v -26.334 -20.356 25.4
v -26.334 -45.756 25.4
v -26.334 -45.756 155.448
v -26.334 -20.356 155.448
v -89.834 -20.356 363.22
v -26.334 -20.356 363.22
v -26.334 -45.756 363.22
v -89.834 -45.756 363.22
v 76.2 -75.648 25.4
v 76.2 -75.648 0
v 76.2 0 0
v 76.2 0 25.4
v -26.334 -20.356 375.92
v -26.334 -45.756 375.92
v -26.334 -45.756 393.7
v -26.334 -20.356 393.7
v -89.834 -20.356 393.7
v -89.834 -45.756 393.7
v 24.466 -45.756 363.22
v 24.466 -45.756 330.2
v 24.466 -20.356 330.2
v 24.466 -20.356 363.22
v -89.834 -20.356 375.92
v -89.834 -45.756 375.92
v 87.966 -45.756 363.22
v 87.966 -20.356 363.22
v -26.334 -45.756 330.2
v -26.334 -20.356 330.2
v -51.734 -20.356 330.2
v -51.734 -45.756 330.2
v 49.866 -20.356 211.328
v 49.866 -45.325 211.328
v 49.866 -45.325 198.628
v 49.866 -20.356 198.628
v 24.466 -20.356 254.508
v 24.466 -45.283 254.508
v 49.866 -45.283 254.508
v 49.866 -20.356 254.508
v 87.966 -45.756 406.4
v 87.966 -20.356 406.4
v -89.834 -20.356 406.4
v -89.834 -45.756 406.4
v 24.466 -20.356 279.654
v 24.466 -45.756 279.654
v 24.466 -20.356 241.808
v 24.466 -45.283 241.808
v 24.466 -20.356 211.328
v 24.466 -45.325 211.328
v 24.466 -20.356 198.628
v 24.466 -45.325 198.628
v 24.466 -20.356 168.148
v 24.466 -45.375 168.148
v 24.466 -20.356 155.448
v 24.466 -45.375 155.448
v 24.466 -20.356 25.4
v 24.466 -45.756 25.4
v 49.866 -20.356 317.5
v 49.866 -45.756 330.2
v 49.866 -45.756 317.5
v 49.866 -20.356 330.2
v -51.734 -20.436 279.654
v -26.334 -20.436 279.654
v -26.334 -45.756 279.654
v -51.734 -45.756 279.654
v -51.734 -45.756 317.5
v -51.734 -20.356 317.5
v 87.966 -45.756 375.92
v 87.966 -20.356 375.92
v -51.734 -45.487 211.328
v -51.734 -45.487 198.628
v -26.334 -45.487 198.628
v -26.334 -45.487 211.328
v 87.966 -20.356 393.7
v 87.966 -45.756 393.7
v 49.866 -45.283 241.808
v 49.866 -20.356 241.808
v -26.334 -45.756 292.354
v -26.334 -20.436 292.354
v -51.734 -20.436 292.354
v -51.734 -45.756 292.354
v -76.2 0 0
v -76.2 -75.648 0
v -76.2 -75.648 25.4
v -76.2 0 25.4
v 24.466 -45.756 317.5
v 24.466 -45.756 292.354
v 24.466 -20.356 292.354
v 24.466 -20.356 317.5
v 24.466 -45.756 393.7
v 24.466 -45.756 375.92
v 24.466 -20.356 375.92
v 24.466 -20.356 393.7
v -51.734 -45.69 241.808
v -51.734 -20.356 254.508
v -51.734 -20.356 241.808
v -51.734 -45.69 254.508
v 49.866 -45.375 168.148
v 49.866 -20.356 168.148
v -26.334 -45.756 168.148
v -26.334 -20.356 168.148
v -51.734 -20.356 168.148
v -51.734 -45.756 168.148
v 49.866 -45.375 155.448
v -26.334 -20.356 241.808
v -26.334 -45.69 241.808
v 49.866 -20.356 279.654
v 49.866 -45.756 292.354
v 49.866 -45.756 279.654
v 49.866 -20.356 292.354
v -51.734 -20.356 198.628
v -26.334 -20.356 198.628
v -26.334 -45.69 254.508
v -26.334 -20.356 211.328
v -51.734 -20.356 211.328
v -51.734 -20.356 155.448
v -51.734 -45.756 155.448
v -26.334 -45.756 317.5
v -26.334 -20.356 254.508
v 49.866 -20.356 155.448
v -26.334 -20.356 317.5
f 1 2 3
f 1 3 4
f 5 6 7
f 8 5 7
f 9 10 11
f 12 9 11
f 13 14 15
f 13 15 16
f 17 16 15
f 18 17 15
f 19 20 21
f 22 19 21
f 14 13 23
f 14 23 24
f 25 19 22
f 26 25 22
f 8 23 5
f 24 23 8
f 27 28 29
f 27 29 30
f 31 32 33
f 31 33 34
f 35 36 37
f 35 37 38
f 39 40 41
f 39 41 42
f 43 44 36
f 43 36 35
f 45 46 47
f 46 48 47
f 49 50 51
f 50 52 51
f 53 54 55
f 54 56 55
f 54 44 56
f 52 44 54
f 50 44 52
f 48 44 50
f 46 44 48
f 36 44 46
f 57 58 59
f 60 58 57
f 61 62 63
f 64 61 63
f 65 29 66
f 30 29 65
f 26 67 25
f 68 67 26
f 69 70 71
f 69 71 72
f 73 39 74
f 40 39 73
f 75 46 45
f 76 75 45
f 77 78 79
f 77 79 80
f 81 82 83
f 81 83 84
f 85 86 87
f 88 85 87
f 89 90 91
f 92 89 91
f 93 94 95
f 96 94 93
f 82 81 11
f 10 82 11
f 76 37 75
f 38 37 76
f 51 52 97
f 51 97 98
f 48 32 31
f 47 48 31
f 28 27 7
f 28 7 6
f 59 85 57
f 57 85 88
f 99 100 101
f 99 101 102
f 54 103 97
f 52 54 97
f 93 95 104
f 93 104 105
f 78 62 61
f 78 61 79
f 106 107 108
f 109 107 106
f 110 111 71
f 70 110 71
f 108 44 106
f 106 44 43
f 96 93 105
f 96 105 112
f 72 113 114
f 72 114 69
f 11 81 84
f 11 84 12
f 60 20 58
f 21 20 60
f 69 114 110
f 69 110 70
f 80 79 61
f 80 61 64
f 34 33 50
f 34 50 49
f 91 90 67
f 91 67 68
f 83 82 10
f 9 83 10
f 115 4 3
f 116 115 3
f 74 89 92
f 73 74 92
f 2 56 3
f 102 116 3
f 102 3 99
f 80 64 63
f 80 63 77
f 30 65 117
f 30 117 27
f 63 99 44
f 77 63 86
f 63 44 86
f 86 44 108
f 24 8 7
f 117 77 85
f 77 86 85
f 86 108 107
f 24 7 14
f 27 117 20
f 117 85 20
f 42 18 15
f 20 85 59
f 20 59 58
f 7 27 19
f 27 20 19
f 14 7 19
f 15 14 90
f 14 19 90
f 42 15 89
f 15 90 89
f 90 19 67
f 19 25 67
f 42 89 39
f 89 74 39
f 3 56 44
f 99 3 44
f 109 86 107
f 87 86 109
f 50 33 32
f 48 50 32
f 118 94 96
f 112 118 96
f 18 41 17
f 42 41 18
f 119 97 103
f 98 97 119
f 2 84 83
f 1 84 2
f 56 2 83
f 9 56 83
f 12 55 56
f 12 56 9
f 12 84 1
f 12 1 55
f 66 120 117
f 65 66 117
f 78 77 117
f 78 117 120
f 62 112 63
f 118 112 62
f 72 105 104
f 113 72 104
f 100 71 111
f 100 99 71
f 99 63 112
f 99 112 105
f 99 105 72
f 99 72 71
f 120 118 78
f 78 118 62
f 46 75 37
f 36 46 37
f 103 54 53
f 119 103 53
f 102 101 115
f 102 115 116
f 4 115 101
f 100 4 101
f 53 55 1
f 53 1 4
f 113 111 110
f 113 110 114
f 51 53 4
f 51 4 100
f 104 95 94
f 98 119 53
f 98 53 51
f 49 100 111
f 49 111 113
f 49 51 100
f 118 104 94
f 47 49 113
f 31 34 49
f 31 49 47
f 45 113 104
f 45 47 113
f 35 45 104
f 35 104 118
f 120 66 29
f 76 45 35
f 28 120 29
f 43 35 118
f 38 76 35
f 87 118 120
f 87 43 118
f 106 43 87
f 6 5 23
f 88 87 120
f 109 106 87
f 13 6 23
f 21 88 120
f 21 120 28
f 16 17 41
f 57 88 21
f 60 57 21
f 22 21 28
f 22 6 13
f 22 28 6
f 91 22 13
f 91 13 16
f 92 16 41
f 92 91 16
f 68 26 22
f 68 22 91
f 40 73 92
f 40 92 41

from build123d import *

# Parameters (mm, degrees)
F0_W      = 152.4
F0_H      = 75.6477481976
F1_DEPTH  = 25.4
F2_W      = 50.8
F2_H      = 25.4
F3_DEPTH  = 381
F4_W      = 25.4
F4_H      = 12.7
F5_DEPTH  = 63.5
F6_W      = 25.4
F6_H      = 12.7
F7_DEPTH  = 63.5
F8_W      = 25.4
F8_H      = 12.7
F9_DEPTH  = 63.5
F10_W     = 25.4
F10_H     = 12.7
F11_DEPTH = 63.5
F12_W     = 25.4
F12_H     = 12.7
F13_DEPTH = 25.4
F14_W     = 25.4
F14_H     = 12.7
F18_DEPTH = 25.4
F15_W     = 24.92688122
F15_H     = 12.7
F19_DEPTH = 25.4
F16_W     = 24.9687274059
F16_H     = 12.7
F20_DEPTH = 25.4
F17_W     = 25.0190113743
F17_H     = 12.7
F21_DEPTH = 25.4
F22_W     = 25.4
F22_H     = 12.7
F27_DEPTH = 25.4
F23_W     = 25.320323884
F23_H     = 12.7
F28_DEPTH = 25.4
F24_W     = 25.3337946793
F24_H     = 12.7
F29_DEPTH = 25.4
F25_W     = 25.1309572571
F25_H     = 12.7
F30_DEPTH = 25.4
F26_W     = 25.4
F26_H     = 12.7
F31_DEPTH = 25.4


with BuildPart() as f1:
    # F0 (on Top) → F1 (new body)
    with BuildSketch(Plane.XY):
        with Locations((-1.49496e-05, -37.8238740988)):
            Rectangle(F0_W, F0_H)
    extrude(amount=F1_DEPTH)

    # F2 (on face) → F3 (join)
    with BuildSketch(Plane.XY.offset(25.4)):
        with Locations((-0.9335875511, -33.0558609421)):
            Rectangle(F2_W, F2_H)
    extrude(amount=F3_DEPTH)

    # F4 (on face) → F5 (join)
    with BuildSketch(Plane.YZ.offset(24.4664124489)):
        with Locations((-33.0558609421, 400.05)):
            Rectangle(F4_W, F4_H)
    extrude(amount=F5_DEPTH)

    # F6 (on face) → F7 (join)
    with BuildSketch(Plane.YZ.offset(24.4664124489)):
        with Locations((-33.0558609421, 369.57)):
            Rectangle(F6_W, F6_H)
    extrude(amount=F7_DEPTH)

    # F8 (on face) → F9 (join)
    with BuildSketch(Plane(origin=(-26.3335875511, 0, 0), x_dir=(0, -1, 0), z_dir=(-1, 0, 0))):
        with Locations((33.0558609421, 400.05)):
            Rectangle(F8_W, F8_H)
    extrude(amount=F9_DEPTH)

    # F10 (on face) → F11 (join)
    with BuildSketch(Plane(origin=(-26.3335875511, 0, 0), x_dir=(0, -1, 0), z_dir=(-1, 0, 0))):
        with Locations((33.0558609421, 369.57)):
            Rectangle(F10_W, F10_H)
    extrude(amount=F11_DEPTH)

    # F12 (on face) → F13 (join)
    with BuildSketch(Plane.YZ.offset(24.4664124489)):
        with Locations((-33.0558609421, 323.85)):
            Rectangle(F12_W, F12_H)
    extrude(amount=F13_DEPTH)

    # F14 (on face) → F18 (join)
    with BuildSketch(Plane.YZ.offset(24.4664124489)):
        with Locations((-33.0558609421, 286.004)):
            Rectangle(F14_W, F14_H)
    extrude(amount=F18_DEPTH)

    # F15 (on face) → F19 (join)
    with BuildSketch(Plane.YZ.offset(24.4664124489)):
        with Locations((-32.8193015521, 248.158)):
            Rectangle(F15_W, F15_H)
    extrude(amount=F19_DEPTH)

    # F16 (on face) → F20 (join)
    with BuildSketch(Plane.YZ.offset(24.4664124489)):
        with Locations((-32.840224645, 204.978)):
            Rectangle(F16_W, F16_H)
    extrude(amount=F20_DEPTH)

    # F17 (on face) → F21 (join)
    with BuildSketch(Plane.YZ.offset(24.4664124489)):
        with Locations((-32.8653666293, 161.798)):
            Rectangle(F17_W, F17_H)
    extrude(amount=F21_DEPTH)

    # F22 (on face) → F27 (join)
    with BuildSketch(Plane(origin=(-26.3335875511, 0, 0), x_dir=(0, -1, 0), z_dir=(-1, 0, 0))):
        with Locations((33.0558609421, 323.85)):
            Rectangle(F22_W, F22_H)
    extrude(amount=F27_DEPTH)

    # F23 (on face) → F28 (join)
    with BuildSketch(Plane(origin=(-26.3335875511, 0, 0), x_dir=(0, -1, 0), z_dir=(-1, 0, 0))):
        with Locations((33.0956990001, 286.004)):
            Rectangle(F23_W, F23_H)
    extrude(amount=F28_DEPTH)

    # F24 (on face) → F29 (join)
    with BuildSketch(Plane(origin=(-26.3335875511, 0, 0), x_dir=(0, -1, 0), z_dir=(-1, 0, 0))):
        with Locations((33.0227582817, 248.158)):
            Rectangle(F24_W, F24_H)
    extrude(amount=F29_DEPTH)

    # F25 (on face) → F30 (join)
    with BuildSketch(Plane(origin=(-26.3335875511, 0, 0), x_dir=(0, -1, 0), z_dir=(-1, 0, 0))):
        with Locations((32.9213395706, 204.978)):
            Rectangle(F25_W, F25_H)
    extrude(amount=F30_DEPTH)

    # F26 (on face) → F31 (join)
    with BuildSketch(Plane(origin=(-26.3335875511, 0, 0), x_dir=(0, -1, 0), z_dir=(-1, 0, 0))):
        with Locations((33.0558609421, 161.798)):
            Rectangle(F26_W, F26_H)
    extrude(amount=F31_DEPTH)


solid = f1.part
